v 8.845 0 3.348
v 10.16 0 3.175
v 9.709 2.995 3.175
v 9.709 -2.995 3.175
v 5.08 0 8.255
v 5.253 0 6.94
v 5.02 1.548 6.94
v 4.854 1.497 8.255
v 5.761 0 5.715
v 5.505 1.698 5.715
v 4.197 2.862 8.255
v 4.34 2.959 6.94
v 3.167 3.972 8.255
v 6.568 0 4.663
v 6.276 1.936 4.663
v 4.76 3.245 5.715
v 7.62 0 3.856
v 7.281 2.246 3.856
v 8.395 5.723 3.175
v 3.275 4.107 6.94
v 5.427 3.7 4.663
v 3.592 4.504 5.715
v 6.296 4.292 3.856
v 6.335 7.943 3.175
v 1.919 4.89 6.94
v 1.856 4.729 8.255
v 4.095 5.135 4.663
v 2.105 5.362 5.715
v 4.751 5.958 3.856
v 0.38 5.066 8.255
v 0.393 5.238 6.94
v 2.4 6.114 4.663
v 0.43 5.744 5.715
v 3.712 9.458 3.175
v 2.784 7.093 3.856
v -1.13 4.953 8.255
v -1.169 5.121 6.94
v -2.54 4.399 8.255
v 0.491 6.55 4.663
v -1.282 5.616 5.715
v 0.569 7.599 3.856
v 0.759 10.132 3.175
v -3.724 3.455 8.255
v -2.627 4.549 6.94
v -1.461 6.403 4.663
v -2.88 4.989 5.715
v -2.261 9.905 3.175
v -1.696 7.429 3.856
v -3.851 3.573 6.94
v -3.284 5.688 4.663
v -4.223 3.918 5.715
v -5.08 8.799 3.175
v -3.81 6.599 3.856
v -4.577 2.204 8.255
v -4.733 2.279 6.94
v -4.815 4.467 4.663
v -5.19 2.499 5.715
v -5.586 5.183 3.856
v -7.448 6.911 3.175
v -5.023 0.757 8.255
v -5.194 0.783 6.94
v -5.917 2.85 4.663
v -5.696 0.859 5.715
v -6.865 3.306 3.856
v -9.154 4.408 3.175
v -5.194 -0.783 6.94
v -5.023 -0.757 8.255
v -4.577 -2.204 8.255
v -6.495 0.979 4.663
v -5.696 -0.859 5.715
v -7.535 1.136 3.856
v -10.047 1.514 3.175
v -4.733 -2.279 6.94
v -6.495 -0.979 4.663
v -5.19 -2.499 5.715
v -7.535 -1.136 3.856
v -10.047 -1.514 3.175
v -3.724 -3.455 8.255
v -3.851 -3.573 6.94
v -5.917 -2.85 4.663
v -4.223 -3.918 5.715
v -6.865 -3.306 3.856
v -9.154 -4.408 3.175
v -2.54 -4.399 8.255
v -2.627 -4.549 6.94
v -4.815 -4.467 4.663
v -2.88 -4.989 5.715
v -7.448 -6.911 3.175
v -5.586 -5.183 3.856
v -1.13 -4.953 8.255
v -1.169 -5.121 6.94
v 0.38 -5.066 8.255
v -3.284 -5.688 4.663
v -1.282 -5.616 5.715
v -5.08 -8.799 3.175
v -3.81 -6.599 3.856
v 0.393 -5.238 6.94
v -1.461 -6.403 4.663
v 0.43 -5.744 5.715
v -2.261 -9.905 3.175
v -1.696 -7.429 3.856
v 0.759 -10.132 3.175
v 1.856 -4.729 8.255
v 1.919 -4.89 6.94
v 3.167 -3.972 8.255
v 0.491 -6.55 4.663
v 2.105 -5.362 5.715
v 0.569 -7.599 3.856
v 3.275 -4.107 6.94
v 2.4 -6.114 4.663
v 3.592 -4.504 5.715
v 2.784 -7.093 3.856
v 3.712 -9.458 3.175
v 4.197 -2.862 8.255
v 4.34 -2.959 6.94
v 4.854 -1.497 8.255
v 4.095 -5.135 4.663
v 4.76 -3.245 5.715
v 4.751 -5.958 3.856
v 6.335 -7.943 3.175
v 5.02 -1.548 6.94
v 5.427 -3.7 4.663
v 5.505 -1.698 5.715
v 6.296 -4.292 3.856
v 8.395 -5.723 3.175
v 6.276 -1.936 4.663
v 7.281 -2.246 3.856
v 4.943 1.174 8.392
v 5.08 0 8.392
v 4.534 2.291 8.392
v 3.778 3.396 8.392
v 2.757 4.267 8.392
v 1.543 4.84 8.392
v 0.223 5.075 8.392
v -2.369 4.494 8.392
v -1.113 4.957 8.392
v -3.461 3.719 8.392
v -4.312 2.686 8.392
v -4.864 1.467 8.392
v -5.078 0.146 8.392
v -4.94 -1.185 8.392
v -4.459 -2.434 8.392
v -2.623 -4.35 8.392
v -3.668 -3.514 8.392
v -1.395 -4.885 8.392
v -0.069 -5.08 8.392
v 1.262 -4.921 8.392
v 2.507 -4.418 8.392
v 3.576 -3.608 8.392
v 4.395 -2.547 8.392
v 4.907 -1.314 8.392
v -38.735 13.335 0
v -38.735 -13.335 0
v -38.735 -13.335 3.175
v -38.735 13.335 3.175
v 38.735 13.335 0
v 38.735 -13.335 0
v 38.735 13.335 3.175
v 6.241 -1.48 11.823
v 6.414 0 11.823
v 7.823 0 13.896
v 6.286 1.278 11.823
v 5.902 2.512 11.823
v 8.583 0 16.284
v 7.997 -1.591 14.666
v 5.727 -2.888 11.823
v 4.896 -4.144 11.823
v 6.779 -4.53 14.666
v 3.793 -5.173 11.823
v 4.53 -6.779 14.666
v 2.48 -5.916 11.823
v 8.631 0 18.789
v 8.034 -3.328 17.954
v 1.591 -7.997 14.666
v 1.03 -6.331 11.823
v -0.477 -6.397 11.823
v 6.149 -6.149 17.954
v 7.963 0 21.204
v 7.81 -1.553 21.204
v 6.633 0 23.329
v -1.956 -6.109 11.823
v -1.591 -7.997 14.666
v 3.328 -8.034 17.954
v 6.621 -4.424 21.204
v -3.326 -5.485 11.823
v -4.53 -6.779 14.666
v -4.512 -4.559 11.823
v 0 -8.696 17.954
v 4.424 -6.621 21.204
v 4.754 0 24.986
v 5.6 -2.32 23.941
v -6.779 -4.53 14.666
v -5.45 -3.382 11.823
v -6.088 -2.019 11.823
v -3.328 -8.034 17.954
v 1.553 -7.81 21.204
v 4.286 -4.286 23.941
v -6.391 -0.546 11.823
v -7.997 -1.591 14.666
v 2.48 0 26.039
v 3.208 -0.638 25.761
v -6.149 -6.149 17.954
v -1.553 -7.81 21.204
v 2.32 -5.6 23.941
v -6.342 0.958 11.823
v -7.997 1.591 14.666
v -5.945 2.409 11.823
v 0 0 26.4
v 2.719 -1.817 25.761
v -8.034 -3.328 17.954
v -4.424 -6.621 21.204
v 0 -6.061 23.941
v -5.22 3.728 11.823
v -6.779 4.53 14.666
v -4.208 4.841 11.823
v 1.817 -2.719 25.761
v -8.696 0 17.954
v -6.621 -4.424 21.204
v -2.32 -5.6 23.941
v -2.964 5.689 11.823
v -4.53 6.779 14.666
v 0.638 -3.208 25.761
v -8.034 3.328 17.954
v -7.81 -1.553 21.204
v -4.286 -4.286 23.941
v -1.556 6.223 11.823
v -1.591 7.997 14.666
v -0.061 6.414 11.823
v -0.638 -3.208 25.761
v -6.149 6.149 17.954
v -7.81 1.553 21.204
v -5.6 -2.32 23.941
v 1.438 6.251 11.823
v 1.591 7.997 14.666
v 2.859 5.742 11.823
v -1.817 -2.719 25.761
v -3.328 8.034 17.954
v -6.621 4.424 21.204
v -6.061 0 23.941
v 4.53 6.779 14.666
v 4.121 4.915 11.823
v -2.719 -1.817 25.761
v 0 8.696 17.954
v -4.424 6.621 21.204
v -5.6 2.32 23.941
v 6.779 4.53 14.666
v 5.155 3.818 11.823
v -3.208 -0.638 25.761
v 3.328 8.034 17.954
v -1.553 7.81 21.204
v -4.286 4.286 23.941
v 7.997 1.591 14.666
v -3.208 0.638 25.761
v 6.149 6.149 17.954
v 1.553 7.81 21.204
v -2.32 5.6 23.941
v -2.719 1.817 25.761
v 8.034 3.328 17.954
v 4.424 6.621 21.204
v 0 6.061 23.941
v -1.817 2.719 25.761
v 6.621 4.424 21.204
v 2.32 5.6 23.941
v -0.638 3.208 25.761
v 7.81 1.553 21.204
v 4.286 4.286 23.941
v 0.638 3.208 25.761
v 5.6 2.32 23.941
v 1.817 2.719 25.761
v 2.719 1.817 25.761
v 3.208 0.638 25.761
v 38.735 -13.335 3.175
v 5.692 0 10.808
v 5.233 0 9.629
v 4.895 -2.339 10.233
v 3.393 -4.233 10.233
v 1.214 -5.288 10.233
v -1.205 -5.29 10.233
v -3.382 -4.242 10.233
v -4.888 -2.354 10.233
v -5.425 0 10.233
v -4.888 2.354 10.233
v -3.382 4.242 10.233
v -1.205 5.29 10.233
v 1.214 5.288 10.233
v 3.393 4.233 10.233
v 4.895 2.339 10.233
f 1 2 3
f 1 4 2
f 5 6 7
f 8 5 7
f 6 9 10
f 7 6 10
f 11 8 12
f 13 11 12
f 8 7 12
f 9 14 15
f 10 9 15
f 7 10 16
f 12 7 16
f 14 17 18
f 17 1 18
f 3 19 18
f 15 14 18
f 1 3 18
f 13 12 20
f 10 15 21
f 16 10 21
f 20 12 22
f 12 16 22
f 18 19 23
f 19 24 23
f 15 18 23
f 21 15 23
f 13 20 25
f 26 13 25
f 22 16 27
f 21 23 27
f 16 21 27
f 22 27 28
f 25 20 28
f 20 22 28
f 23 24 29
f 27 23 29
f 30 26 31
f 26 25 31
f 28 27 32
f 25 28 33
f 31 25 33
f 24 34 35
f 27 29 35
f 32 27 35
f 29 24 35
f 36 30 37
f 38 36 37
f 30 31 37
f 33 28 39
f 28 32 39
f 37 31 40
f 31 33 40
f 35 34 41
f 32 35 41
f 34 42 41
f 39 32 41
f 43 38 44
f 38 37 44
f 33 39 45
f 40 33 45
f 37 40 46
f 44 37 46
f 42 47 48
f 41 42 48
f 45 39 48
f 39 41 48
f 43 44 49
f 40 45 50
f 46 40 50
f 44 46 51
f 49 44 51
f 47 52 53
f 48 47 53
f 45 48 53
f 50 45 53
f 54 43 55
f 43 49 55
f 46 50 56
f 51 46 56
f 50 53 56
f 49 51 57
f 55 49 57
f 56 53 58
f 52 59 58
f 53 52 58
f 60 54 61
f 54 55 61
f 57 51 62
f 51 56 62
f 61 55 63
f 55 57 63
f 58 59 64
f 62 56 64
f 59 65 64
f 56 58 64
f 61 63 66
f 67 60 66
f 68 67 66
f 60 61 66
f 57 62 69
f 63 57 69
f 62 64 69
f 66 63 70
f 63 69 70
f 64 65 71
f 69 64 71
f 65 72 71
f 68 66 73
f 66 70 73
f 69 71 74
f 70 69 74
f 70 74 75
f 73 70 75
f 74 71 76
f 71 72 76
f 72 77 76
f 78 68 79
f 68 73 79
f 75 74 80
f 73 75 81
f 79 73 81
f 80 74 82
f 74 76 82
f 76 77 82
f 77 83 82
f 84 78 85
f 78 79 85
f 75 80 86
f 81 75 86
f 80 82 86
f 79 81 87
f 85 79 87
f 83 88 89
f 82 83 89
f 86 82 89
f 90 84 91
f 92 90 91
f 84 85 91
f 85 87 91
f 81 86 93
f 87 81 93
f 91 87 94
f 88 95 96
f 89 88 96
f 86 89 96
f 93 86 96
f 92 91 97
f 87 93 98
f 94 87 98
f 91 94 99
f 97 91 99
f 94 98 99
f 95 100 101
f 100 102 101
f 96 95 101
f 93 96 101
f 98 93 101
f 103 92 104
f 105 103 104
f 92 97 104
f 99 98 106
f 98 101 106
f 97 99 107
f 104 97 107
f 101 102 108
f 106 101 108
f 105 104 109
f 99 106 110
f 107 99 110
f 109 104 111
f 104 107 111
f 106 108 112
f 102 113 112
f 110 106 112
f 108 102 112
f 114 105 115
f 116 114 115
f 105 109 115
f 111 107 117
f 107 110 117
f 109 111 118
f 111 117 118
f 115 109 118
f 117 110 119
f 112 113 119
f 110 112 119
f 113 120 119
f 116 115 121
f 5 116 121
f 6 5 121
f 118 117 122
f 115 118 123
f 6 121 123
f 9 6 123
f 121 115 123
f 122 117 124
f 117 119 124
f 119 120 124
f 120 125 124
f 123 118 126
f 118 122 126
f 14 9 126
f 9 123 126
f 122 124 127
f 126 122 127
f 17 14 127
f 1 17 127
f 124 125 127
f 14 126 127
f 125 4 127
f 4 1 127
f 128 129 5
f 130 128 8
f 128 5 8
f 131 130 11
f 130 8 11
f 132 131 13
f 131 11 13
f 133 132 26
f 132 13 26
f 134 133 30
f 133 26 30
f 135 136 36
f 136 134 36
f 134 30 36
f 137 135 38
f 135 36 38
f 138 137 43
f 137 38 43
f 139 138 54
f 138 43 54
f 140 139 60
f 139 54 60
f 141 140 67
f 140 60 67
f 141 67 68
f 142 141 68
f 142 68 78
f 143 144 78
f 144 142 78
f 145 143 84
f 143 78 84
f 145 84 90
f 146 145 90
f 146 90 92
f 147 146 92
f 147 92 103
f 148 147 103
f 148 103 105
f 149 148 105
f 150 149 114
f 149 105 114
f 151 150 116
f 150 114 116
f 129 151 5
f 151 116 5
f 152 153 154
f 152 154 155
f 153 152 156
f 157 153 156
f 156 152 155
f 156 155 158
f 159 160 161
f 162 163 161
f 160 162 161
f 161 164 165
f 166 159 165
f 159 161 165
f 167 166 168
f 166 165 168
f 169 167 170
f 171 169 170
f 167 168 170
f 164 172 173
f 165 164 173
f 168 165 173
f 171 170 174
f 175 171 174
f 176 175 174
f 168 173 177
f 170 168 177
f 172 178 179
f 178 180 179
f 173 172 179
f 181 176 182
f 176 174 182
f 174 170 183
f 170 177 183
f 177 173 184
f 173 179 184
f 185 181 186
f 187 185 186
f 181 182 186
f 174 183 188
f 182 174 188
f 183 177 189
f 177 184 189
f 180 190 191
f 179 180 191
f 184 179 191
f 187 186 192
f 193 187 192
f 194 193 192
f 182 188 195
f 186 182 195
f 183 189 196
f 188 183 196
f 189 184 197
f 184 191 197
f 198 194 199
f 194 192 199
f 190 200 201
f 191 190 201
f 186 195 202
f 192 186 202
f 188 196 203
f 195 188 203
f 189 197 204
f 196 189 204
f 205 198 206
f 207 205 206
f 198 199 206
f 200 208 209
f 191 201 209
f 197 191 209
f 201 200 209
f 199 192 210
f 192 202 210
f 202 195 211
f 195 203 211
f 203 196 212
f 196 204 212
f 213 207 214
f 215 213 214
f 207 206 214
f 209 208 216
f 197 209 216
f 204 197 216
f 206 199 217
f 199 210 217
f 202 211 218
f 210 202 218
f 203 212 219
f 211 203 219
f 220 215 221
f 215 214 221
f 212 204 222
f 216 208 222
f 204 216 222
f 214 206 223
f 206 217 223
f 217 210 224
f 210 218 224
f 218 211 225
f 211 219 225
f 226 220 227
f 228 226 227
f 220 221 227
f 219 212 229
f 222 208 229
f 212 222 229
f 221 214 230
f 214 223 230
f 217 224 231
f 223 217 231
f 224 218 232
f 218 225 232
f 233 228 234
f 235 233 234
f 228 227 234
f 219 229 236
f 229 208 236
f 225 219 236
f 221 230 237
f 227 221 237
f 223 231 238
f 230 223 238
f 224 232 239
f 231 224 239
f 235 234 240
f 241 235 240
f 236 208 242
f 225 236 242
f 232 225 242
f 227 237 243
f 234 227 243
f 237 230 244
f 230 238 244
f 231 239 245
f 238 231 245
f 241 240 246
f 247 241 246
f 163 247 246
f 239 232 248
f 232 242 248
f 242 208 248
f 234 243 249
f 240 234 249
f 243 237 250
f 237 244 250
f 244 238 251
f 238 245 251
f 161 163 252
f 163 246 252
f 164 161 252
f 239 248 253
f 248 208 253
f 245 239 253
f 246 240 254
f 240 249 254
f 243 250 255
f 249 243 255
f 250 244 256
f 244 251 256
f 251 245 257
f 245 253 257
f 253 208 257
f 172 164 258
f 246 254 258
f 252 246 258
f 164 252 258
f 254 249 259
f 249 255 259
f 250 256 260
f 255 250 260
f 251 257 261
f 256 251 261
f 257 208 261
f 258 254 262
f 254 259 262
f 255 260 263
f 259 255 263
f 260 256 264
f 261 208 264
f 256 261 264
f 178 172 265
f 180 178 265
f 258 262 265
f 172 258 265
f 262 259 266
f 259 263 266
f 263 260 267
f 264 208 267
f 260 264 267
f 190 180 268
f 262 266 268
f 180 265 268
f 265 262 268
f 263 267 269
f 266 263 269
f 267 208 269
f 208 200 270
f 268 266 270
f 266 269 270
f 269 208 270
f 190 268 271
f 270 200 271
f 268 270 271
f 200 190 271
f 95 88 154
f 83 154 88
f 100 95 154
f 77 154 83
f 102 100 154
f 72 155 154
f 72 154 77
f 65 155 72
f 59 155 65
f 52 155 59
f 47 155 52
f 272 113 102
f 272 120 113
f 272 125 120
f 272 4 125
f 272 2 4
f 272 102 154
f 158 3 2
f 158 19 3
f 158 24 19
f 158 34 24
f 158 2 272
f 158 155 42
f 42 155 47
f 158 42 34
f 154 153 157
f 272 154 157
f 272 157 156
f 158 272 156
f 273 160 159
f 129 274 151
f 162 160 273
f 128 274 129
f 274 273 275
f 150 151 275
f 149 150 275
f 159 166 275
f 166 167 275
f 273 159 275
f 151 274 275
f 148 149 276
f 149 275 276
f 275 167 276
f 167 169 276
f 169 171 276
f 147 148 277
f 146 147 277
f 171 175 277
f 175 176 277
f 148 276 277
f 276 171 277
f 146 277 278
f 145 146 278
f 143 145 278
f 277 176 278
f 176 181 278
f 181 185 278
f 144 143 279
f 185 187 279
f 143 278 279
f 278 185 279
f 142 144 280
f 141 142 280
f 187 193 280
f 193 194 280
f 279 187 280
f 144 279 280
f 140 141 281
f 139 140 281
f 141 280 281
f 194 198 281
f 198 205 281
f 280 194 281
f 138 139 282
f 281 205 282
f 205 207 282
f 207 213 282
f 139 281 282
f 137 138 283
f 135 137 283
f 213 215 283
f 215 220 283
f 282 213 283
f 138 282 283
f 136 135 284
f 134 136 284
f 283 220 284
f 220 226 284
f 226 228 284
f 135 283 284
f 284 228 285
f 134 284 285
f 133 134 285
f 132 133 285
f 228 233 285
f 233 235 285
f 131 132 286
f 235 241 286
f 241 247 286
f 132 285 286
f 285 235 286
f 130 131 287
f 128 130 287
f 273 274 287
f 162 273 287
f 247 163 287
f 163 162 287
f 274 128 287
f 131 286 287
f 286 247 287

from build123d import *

# Parameters (mm, degrees)
F0_W     = 77.47
F0_H     = 26.67
F1_DEPTH = 3.175
F2_R     = 5.08
F3_DEPTH = 14.525168
F6_R     = 5.08


with BuildPart() as f1:
    # F0 (on Top) → F1 (new body)
    with BuildSketch(Plane.XY):
        Rectangle(F0_W, F0_H)
    extrude(amount=F1_DEPTH)

    # F2 (on face) → F3 (join)
    with BuildSketch(Plane.XY.offset(3.175)):
        Circle(F2_R)
    extrude(amount=F3_DEPTH)

    # F4 (on Front) → F5 (revolve)
    with BuildSketch(Plane.XZ):
        with BuildLine():
            Line((0, 26.399668), (0, 9.000668))
            ThreePointArc((0, 9.000668), (8.6995, 17.700168), (0, 26.399668))
        make_face()
    revolve(axis=Axis((0, 0, 17.700168), (0, 0, -1)))

    # F6
    f6_edges = [f1.edges().sort_by_distance(p)[0] for p in [
        (-5.08, 0, 3.175),
        (-5.08, 0, 10.637951),
    ]]
    fillet(f6_edges, radius=F6_R)


solid = f1.part
